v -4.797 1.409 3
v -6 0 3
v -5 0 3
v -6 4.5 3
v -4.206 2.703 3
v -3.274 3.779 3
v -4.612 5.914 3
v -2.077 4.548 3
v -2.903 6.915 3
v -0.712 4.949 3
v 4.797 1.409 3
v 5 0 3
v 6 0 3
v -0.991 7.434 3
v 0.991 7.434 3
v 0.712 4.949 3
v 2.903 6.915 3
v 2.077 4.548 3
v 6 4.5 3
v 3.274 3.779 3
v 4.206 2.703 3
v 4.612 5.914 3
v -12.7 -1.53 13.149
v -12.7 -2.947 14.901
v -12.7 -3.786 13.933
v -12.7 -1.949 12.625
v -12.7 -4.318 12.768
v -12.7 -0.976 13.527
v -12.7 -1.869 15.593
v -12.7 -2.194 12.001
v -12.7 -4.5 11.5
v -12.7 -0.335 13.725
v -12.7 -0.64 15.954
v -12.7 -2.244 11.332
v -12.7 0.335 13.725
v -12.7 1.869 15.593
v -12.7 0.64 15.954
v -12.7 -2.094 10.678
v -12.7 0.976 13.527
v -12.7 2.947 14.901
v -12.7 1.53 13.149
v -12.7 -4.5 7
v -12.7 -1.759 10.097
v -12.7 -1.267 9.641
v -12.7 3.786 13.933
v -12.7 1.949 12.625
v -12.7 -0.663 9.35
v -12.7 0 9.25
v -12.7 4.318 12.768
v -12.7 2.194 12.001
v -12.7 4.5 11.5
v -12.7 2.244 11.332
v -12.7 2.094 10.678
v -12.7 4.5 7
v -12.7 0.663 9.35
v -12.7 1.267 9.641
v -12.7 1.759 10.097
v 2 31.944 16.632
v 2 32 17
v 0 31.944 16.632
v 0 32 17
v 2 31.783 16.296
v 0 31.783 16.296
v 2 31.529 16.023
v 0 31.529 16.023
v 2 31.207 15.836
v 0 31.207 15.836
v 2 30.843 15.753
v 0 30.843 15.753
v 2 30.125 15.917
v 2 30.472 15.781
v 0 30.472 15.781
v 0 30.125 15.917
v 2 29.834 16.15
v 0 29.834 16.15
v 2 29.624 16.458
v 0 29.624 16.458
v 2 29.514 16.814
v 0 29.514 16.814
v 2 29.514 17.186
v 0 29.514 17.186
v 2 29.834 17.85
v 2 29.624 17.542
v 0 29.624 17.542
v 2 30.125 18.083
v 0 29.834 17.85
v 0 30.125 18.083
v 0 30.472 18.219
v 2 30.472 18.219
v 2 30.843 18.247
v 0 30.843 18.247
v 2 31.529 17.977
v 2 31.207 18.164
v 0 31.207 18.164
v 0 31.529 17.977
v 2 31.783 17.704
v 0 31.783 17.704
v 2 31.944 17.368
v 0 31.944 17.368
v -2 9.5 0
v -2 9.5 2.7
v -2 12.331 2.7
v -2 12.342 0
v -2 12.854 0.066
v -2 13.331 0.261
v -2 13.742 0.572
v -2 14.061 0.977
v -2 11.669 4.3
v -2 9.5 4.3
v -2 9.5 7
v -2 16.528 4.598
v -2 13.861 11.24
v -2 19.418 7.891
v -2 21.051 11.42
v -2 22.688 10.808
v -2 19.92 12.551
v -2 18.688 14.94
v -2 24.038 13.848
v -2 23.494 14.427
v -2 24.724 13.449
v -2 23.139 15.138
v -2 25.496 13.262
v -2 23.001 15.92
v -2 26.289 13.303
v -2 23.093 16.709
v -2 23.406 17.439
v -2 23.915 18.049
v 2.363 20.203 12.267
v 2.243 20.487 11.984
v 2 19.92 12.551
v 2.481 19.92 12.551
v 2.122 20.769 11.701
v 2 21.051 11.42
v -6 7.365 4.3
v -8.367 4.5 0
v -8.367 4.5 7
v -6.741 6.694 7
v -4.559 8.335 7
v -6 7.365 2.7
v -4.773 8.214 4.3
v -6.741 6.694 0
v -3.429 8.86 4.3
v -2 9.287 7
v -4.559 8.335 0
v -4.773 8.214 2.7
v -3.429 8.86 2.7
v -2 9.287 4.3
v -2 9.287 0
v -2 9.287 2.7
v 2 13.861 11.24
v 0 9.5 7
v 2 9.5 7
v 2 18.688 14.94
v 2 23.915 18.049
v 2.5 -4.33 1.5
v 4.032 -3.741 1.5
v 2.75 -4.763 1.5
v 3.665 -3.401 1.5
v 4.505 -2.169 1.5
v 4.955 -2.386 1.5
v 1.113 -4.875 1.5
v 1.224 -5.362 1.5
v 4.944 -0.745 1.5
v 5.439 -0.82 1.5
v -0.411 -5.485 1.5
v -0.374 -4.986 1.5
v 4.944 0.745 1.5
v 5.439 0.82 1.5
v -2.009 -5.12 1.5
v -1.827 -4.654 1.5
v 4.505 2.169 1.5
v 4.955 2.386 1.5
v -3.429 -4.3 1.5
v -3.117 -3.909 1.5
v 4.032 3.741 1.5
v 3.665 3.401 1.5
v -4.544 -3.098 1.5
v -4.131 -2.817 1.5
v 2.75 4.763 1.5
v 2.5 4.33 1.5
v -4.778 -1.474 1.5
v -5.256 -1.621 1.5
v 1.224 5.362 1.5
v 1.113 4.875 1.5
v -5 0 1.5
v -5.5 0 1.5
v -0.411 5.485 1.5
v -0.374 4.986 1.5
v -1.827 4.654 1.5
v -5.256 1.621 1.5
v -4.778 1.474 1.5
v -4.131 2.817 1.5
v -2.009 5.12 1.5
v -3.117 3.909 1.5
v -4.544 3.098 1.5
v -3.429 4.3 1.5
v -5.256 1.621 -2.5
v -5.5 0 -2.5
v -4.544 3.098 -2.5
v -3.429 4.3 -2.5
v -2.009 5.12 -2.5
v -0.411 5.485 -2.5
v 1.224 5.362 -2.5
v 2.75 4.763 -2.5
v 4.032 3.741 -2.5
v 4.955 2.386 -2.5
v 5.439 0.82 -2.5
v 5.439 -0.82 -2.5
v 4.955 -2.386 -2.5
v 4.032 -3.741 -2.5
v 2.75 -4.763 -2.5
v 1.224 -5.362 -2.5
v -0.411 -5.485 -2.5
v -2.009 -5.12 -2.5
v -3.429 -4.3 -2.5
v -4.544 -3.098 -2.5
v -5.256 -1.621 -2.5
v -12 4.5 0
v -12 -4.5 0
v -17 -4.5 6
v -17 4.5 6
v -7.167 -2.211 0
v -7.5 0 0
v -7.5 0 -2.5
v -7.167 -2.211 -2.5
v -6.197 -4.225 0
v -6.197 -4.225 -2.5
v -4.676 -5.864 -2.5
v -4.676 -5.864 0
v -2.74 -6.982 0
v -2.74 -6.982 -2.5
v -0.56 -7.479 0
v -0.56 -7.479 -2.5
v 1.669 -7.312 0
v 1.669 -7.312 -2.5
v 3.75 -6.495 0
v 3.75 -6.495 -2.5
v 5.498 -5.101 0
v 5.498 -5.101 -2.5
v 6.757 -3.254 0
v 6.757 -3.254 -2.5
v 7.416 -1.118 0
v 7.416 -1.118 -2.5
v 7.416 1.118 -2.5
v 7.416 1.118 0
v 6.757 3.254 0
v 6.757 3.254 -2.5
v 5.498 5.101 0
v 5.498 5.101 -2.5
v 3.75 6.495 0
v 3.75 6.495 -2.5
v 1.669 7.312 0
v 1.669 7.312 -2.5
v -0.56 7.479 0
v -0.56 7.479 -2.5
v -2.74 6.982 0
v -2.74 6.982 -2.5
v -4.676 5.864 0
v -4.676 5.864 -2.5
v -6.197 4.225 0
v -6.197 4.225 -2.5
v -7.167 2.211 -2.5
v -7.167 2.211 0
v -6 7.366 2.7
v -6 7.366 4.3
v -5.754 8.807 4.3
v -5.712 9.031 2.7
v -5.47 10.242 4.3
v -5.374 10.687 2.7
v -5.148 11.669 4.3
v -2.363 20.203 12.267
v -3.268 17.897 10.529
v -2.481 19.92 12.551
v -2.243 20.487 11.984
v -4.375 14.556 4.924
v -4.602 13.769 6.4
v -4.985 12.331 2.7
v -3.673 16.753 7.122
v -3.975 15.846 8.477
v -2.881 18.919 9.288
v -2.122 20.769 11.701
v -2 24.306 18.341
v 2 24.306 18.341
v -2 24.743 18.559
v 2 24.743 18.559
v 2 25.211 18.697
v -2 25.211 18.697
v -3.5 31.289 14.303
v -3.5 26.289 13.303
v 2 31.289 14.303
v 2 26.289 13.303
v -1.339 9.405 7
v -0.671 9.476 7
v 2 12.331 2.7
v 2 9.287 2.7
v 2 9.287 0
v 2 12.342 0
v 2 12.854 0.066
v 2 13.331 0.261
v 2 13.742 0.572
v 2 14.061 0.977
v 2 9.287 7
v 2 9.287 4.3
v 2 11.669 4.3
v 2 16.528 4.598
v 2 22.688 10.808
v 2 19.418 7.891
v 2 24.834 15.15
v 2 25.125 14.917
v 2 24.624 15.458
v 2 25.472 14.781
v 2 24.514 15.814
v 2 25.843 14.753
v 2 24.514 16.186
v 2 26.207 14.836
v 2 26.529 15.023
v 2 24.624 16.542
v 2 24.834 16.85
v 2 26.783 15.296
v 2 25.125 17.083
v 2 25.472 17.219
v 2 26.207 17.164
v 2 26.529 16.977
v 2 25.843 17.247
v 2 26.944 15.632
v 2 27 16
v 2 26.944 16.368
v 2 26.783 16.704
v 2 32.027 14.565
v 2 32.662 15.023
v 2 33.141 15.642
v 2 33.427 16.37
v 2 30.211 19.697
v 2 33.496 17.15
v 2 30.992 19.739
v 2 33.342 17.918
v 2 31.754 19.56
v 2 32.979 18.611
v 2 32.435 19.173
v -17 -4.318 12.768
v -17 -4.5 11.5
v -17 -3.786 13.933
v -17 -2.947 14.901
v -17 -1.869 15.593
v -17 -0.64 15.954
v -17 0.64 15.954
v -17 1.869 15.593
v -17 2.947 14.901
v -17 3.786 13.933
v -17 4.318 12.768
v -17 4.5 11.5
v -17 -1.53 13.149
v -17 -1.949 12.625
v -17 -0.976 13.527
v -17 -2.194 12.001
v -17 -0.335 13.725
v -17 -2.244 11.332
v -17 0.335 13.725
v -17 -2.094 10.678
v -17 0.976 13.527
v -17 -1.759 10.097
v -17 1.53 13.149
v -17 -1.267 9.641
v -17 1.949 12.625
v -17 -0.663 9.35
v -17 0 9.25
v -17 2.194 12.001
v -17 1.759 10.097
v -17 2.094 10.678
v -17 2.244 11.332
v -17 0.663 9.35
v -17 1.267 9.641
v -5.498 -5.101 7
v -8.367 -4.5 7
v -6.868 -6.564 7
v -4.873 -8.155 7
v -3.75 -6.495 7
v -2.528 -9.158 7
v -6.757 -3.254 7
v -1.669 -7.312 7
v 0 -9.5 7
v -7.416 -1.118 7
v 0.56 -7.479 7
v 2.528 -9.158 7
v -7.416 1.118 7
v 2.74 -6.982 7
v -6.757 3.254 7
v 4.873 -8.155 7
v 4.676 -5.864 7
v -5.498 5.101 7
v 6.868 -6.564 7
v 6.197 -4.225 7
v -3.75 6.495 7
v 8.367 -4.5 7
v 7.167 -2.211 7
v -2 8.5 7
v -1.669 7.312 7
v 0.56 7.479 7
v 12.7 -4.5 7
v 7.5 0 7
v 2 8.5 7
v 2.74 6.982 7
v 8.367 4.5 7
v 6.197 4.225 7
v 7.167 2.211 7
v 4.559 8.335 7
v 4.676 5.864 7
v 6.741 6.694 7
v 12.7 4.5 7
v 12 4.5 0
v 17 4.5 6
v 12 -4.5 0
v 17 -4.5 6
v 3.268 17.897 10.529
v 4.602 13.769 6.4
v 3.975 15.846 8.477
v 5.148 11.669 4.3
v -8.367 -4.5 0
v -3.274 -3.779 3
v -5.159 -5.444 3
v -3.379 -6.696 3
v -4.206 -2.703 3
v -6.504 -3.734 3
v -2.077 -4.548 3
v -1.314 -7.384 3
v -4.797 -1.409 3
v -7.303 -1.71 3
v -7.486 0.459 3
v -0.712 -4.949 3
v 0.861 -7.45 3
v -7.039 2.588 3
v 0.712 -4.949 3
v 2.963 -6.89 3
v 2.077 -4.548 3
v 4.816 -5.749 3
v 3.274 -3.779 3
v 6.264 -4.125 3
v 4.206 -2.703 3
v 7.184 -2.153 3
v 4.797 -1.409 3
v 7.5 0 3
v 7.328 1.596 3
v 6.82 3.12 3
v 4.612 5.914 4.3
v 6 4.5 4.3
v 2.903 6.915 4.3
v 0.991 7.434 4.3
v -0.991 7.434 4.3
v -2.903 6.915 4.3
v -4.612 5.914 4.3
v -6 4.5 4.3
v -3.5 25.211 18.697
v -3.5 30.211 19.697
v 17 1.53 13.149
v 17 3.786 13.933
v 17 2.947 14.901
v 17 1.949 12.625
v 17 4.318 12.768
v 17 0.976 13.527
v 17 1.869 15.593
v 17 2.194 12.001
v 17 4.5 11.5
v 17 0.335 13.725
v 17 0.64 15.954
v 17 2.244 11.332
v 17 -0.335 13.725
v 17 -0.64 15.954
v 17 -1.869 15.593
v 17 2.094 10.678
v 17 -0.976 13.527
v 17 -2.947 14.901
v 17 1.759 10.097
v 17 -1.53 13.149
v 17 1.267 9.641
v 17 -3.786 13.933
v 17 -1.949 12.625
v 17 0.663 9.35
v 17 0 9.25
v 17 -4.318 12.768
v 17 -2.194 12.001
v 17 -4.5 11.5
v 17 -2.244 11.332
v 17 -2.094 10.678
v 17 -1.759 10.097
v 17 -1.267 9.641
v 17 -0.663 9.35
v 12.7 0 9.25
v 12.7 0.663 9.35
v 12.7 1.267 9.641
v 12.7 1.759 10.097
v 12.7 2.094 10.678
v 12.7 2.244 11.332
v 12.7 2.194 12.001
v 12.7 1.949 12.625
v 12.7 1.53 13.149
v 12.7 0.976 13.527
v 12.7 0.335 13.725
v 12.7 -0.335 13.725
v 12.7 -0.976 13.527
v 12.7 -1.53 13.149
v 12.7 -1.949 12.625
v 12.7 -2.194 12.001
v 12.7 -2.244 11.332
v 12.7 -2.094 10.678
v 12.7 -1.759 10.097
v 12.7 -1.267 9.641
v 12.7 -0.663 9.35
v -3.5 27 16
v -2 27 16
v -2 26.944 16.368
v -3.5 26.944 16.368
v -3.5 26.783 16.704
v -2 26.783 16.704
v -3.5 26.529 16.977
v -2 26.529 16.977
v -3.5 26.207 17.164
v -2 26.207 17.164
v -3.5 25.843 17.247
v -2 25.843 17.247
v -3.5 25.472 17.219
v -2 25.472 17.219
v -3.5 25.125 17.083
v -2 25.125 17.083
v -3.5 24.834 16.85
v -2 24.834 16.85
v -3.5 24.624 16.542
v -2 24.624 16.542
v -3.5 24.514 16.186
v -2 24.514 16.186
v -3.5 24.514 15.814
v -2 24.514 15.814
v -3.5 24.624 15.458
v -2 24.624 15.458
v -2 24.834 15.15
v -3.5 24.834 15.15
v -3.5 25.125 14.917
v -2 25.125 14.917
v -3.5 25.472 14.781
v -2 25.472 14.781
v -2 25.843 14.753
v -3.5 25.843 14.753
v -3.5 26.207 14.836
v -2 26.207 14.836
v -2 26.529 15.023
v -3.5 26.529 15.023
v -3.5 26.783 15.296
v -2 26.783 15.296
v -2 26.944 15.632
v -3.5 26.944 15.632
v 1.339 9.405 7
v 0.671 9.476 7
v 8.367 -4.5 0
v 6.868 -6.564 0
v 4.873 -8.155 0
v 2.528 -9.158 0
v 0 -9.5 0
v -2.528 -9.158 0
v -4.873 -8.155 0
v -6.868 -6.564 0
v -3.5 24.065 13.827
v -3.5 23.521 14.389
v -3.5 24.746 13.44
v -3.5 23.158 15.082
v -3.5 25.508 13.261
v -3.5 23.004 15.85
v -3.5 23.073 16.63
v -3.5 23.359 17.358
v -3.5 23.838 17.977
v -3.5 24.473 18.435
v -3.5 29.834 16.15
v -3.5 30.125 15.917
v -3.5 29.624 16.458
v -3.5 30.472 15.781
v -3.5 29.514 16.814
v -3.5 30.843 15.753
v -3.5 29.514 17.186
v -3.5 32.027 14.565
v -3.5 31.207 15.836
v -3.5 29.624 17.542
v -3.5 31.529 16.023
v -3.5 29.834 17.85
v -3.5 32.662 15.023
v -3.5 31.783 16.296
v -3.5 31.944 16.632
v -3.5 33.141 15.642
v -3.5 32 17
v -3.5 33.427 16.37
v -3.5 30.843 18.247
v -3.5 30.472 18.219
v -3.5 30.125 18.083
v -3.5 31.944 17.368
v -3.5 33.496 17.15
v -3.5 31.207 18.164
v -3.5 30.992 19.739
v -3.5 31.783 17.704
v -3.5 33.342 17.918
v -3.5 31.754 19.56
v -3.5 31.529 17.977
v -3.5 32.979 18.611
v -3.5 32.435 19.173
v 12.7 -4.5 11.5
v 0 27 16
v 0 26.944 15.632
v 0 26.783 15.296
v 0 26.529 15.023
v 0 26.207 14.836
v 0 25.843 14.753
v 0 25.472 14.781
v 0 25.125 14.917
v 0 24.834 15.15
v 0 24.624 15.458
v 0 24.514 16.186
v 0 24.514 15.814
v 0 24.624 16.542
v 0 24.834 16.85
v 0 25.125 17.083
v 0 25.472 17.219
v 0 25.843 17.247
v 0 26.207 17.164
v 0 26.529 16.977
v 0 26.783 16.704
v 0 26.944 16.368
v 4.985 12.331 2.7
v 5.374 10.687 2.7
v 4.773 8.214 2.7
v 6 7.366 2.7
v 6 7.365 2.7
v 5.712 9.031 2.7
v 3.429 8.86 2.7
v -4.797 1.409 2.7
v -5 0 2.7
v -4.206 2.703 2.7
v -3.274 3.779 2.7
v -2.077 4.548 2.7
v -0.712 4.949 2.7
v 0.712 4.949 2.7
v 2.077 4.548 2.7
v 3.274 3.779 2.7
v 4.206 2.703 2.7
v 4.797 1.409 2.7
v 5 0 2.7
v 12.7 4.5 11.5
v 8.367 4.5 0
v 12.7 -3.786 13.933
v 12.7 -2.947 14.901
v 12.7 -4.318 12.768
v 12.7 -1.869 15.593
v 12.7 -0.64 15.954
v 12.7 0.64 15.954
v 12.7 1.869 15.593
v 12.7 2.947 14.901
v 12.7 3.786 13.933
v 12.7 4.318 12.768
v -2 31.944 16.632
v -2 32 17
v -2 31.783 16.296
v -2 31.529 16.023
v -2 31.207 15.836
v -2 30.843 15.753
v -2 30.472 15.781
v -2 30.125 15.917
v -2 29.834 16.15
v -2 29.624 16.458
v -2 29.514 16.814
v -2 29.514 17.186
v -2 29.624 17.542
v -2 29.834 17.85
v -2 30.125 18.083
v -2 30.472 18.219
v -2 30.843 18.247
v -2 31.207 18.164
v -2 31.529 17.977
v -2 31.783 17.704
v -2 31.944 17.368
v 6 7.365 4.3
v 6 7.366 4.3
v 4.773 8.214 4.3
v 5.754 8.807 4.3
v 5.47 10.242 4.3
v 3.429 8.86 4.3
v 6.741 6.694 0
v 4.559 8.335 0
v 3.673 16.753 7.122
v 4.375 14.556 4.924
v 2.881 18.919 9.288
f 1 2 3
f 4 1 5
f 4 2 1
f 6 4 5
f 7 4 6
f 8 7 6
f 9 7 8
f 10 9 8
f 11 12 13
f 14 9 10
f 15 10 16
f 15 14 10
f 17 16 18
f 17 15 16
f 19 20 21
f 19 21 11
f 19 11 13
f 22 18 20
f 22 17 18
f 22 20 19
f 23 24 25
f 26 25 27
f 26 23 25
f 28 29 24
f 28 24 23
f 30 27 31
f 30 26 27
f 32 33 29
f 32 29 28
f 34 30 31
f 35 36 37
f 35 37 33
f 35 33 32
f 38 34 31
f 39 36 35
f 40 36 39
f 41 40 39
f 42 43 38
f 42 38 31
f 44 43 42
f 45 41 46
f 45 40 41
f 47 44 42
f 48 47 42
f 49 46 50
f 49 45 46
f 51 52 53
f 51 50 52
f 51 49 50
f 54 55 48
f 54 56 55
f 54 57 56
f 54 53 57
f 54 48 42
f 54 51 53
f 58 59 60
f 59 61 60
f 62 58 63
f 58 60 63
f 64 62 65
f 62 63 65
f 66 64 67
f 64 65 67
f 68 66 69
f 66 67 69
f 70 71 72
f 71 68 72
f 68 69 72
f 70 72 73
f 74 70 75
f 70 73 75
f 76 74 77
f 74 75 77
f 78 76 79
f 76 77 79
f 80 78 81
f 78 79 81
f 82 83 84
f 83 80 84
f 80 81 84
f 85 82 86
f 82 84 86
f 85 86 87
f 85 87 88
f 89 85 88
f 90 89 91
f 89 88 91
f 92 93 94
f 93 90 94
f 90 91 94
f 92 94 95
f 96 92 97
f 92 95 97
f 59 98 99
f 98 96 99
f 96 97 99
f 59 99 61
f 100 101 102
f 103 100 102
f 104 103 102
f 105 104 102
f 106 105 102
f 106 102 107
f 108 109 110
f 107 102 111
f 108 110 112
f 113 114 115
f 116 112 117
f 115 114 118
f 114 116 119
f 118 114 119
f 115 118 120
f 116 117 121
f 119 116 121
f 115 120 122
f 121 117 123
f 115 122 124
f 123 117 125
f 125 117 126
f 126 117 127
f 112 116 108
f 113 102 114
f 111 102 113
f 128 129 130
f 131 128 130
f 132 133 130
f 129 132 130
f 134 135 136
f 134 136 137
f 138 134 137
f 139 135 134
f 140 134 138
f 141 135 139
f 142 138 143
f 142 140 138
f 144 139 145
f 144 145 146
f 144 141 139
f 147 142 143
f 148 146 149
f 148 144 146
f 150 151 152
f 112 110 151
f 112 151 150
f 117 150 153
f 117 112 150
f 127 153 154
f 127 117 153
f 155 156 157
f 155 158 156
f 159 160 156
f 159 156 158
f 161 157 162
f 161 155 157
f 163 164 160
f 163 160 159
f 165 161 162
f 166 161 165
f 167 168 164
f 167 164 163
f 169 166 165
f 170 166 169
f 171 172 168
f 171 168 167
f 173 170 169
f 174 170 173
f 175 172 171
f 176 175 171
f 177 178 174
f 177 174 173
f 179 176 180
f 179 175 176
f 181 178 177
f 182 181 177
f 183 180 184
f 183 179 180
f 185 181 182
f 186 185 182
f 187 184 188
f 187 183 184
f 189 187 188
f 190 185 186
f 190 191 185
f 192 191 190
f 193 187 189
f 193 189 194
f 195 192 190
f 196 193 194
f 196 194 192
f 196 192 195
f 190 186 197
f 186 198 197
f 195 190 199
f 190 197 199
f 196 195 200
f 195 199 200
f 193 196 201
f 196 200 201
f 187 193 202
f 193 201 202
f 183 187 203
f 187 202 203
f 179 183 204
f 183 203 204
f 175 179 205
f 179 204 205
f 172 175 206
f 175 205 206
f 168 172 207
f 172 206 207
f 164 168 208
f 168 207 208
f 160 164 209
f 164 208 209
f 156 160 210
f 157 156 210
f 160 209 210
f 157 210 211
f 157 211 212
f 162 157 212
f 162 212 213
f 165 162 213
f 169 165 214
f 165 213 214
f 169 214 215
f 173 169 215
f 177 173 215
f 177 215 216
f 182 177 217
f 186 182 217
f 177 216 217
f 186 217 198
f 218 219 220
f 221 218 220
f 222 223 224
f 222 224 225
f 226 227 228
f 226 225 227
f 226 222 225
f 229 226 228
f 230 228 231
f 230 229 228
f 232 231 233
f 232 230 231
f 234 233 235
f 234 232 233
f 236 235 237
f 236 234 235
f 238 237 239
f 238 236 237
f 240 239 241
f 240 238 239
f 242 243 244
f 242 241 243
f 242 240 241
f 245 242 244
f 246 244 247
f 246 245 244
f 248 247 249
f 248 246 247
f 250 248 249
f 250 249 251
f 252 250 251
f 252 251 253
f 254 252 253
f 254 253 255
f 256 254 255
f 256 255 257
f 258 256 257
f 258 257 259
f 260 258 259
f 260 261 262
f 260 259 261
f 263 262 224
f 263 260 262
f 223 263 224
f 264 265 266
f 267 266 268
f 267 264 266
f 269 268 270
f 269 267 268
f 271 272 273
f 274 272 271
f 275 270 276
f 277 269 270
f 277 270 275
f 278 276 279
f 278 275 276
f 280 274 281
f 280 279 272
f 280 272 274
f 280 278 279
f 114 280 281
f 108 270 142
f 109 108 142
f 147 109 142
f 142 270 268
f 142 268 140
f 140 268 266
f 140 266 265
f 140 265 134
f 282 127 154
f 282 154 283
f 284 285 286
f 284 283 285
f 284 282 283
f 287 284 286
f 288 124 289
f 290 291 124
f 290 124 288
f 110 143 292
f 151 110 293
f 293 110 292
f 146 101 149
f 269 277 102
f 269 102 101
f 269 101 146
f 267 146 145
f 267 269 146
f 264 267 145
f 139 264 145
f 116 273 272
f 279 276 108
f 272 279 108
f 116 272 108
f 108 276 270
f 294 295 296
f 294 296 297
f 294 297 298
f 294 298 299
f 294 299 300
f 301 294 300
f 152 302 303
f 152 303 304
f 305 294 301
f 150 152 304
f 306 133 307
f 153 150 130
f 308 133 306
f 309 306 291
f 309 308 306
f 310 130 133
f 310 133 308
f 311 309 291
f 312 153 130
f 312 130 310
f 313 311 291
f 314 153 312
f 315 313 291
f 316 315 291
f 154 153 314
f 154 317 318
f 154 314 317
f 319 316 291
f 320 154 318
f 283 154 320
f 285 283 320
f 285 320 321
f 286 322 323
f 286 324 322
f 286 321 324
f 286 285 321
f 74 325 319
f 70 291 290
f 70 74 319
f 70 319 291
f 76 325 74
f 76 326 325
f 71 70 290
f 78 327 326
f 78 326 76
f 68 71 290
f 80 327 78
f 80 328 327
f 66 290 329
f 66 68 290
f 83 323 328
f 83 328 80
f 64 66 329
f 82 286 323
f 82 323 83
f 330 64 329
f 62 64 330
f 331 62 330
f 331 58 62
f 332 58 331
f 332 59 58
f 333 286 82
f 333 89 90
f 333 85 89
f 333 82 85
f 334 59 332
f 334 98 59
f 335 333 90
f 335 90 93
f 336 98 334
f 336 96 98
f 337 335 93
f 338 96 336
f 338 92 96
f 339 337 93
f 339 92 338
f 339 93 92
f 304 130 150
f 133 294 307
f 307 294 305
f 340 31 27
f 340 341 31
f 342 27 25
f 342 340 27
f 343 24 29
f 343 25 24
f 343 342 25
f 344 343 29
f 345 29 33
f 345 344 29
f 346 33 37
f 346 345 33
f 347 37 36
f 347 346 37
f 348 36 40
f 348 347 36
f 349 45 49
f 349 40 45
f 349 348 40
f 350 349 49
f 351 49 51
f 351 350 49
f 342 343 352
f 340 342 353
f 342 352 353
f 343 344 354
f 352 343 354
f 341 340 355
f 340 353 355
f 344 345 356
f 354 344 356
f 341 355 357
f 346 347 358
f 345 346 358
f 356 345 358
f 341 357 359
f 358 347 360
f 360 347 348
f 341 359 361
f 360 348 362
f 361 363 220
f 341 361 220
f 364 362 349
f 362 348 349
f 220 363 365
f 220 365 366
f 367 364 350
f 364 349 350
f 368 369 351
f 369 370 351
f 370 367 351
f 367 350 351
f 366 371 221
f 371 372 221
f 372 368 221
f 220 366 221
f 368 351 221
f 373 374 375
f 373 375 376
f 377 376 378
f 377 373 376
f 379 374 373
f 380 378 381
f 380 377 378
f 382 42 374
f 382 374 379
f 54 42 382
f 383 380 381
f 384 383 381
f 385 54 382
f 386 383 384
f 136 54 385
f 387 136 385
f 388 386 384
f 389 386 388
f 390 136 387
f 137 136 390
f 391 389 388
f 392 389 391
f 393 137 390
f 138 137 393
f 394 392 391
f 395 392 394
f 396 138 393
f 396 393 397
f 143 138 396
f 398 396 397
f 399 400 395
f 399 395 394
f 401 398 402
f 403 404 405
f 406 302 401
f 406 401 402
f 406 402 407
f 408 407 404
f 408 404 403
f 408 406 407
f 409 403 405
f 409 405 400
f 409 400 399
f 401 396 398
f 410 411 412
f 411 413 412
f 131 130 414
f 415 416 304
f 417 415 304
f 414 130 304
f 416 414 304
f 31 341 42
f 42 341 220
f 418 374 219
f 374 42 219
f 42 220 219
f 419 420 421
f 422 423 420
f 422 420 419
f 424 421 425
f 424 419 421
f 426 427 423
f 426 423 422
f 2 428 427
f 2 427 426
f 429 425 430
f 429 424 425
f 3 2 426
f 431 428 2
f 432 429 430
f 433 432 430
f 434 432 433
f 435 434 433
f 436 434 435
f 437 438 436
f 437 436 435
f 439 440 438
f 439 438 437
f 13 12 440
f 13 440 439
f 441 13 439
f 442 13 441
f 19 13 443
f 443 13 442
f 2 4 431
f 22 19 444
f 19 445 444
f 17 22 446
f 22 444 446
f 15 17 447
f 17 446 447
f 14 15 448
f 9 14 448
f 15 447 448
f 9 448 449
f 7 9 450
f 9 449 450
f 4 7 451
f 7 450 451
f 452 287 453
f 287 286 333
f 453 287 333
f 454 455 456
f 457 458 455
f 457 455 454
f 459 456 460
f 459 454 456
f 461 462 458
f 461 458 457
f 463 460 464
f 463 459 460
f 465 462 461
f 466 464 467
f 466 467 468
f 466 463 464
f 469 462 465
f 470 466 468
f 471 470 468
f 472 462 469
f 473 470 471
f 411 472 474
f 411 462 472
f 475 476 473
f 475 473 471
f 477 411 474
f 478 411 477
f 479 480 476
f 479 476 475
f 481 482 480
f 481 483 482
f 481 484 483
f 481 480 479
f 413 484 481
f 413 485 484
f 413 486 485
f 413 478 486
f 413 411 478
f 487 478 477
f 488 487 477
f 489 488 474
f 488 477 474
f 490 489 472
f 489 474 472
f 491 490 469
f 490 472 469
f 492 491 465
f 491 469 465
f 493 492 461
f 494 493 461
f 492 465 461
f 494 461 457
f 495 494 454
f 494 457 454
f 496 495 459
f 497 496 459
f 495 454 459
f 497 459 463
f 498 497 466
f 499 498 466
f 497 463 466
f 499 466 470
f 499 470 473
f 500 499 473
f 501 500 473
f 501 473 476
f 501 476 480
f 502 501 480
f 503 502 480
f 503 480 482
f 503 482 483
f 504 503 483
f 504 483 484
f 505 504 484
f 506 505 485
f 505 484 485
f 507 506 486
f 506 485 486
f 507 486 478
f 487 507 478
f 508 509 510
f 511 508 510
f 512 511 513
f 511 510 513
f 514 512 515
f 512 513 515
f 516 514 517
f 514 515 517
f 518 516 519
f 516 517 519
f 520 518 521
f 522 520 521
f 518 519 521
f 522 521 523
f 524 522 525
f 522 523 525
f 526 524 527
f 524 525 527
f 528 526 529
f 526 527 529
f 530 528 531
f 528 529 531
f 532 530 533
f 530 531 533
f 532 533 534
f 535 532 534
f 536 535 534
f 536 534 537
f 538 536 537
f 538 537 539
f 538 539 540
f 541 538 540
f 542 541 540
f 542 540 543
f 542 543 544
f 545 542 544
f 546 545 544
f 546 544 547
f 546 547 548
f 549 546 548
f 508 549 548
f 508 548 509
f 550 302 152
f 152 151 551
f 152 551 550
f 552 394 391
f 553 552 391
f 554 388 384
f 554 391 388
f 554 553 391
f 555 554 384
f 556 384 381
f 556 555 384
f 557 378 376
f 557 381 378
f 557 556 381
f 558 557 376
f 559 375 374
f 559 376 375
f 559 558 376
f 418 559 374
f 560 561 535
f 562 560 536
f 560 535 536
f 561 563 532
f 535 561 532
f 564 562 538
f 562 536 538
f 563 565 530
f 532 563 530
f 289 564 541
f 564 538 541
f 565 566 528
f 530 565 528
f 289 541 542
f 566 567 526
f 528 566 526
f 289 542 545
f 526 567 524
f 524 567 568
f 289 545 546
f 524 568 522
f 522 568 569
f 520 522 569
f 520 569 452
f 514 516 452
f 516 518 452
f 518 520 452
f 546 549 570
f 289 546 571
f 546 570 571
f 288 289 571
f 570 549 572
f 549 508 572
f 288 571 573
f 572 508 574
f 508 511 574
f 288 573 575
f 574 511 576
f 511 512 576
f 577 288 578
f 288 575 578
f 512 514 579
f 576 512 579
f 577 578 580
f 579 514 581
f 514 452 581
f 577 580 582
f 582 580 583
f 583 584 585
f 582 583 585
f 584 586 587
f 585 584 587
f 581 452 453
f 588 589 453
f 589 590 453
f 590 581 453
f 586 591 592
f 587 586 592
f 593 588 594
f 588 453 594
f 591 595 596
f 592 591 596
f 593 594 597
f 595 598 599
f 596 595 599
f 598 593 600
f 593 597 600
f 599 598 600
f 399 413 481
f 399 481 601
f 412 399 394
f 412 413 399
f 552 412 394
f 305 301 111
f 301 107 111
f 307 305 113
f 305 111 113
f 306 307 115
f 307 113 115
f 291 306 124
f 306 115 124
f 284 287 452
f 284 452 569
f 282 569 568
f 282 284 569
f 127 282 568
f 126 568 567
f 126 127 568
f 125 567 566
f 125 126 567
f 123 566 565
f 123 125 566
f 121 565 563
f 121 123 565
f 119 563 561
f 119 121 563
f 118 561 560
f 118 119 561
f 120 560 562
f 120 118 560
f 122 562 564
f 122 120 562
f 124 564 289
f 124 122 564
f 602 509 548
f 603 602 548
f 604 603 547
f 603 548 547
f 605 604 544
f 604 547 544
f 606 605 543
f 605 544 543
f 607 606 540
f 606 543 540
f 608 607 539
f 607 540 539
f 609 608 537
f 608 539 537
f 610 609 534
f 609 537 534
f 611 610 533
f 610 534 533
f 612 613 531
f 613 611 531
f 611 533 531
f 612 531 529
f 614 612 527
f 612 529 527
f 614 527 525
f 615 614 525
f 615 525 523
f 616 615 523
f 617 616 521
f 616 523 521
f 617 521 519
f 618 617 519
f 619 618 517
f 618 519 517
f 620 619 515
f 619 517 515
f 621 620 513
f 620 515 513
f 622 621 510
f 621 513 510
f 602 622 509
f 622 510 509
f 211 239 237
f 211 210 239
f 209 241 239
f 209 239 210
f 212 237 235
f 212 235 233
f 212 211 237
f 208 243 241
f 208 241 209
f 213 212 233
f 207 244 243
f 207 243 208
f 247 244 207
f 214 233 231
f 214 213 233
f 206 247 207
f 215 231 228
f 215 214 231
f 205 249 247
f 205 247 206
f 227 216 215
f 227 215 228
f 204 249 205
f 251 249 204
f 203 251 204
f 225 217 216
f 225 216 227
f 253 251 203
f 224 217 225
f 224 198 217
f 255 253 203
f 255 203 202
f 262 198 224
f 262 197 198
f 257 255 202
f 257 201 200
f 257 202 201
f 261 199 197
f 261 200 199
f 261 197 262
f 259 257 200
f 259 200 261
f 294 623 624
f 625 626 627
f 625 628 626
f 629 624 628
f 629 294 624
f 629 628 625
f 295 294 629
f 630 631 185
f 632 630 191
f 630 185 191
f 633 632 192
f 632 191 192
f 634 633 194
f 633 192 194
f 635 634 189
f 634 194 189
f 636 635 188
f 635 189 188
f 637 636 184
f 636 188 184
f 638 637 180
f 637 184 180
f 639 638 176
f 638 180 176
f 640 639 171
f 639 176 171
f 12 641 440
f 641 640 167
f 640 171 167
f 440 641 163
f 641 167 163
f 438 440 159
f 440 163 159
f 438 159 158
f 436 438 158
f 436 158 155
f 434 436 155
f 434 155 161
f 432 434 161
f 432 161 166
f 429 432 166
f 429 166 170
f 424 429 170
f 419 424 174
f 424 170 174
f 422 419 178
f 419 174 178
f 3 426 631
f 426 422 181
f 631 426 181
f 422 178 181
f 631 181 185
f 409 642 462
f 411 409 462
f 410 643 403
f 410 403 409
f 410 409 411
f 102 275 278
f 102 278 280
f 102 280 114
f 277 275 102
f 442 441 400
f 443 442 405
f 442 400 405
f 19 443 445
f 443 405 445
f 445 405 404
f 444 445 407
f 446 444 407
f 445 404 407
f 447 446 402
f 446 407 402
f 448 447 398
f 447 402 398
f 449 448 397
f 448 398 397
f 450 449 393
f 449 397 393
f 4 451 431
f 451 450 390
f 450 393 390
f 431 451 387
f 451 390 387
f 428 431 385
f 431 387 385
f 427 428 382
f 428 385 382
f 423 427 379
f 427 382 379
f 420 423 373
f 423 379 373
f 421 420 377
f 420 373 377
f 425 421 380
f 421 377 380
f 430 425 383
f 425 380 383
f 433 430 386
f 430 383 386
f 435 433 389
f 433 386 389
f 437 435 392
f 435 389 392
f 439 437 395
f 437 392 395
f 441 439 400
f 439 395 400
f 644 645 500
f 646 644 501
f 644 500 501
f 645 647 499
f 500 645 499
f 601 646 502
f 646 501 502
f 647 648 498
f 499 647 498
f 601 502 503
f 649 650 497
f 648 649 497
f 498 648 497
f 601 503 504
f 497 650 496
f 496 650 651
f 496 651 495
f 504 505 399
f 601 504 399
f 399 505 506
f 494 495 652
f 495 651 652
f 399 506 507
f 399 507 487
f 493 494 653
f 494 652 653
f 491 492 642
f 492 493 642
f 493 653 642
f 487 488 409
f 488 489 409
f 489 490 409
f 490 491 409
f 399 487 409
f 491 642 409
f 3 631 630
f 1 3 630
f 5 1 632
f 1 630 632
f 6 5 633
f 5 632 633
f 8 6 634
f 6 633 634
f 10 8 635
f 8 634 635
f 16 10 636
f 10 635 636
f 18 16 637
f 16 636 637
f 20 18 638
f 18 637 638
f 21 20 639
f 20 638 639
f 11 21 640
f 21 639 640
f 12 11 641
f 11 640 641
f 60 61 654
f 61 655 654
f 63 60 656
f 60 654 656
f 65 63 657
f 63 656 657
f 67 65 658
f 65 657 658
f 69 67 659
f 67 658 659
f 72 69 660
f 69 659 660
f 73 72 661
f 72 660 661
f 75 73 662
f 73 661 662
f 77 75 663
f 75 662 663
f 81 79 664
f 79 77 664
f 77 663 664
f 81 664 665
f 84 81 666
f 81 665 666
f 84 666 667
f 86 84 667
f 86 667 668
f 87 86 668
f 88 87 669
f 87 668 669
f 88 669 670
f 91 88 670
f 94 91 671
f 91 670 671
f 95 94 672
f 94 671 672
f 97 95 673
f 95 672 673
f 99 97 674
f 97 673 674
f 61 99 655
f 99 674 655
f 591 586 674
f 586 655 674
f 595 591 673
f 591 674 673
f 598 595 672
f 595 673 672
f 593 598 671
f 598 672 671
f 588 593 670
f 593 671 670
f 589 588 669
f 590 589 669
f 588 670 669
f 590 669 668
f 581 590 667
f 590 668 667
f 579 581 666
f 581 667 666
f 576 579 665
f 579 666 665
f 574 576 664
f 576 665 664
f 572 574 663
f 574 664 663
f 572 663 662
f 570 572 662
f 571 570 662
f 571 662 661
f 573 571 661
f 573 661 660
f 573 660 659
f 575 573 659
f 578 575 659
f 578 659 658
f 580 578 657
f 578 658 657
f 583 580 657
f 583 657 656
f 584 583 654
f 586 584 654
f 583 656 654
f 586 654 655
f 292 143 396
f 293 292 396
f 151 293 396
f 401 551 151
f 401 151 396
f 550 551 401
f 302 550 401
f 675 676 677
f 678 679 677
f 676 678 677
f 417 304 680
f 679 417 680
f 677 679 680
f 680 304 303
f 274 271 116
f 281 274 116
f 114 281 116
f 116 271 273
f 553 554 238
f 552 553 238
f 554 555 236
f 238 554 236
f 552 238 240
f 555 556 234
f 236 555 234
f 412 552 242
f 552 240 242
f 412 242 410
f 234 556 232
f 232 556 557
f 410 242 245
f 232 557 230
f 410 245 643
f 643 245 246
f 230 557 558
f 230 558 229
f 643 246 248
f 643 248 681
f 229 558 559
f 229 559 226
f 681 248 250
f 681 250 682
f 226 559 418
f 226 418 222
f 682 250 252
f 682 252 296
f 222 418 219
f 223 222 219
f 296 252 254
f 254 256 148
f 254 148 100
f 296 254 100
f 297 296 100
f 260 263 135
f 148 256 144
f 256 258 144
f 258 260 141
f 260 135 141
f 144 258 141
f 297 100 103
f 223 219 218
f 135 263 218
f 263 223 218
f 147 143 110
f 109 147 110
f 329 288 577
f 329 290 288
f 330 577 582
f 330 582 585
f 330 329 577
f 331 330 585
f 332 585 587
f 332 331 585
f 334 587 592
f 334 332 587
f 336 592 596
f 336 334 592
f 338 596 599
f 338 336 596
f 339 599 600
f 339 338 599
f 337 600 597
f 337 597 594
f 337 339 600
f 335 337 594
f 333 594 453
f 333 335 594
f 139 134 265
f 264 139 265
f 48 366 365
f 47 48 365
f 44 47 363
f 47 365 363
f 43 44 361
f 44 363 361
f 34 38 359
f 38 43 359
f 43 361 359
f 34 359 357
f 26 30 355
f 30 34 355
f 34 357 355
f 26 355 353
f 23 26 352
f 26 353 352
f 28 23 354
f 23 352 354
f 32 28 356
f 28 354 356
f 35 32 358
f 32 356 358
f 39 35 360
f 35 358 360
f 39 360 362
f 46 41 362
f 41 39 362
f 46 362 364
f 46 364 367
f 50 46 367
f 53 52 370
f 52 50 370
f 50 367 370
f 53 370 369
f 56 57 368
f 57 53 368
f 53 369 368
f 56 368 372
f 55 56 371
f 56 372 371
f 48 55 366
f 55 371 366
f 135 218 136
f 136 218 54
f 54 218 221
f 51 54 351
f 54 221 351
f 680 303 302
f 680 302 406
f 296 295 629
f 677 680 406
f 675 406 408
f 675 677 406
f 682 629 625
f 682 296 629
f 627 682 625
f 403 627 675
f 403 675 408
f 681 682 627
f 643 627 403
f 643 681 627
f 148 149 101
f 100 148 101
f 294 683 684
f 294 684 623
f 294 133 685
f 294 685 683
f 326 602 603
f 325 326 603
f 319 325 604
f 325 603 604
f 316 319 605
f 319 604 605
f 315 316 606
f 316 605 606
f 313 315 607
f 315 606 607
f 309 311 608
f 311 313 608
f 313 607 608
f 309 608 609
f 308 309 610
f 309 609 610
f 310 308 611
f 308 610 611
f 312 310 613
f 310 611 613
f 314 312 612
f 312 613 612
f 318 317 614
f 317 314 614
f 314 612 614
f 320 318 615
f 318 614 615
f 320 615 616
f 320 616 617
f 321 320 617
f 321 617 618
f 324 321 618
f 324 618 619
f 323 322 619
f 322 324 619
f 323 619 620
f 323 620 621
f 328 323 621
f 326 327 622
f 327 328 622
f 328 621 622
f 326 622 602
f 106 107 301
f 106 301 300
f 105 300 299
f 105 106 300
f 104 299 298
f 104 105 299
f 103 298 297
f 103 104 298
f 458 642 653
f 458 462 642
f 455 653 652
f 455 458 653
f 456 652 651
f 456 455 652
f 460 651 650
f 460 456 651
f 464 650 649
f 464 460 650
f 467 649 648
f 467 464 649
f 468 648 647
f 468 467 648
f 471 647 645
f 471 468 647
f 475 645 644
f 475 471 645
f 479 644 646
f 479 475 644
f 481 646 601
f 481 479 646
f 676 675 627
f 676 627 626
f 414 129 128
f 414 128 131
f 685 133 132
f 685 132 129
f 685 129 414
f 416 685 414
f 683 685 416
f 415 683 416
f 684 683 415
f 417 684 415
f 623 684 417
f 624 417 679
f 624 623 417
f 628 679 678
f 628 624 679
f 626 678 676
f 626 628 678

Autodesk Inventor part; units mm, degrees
ref_plane "YZ Plane" through (0, 0, 0) normal (1, 0, 0) x (0, 1, 0)
ref_plane "XZ Plane" through (0, 0, 0) normal (0, 1, 0) x (-1, 0, 0)
ref_plane "XY Plane" through (0, 0, 0) normal (0, 0, 1) x (1, 0, 0)
sketch "Sketch1" plane through (0, 0, 0) normal (0, 0, 1) x (1, 0, 0)
  line L0 (17, 4.5) -> (17, -4.5)
  line L1 (-17, -4.5) -> (-17, 4.5)
  arc A0 (-8.3666, -4.5) -> (8.3666, -4.5) centre (0, 0) ccw
  arc A1 (8.3666, 4.5) -> (-8.3666, 4.5) centre (0, 0) ccw
  line L2 (-17, 4.5) -> (-8.3666, 4.5)
  line L3 (8.3666, 4.5) -> (17, 4.5)
  line L4 (17, -4.5) -> (8.3666, -4.5)
  line L5 (-8.3666, -4.5) -> (-17, -4.5)
  line L6 (-17, 4.5) -> (17, -4.5) construction
  line L7 (-17, -4.5) -> (17, 4.5) construction
  point P0 (0, 0)
  point P1 (0, 0)
  dimension "d0" = 9
  dimension "d1" = 34
  dimension "d2" = 9.5
  dimension "d3" = 9
  dimension "d4" = 9.5
  dimension "d12" = 4.5
extrude "Extrusion1" add sketch "Sketch1" along normal blind 7
sketch "Sketch2" plane through (17, -4.5, 0) normal (1, 0, 0) x (0, 0, -1)
  arc A0 (-11.5, 9) -> (-11.5, 0) centre (-11.5, 4.5) ccw
  circle A1 centre (-11.5, 4.5) radius 2.25
  line L0 (-7, 9) -> (-11.5, 9)
  line L1 (-11.5, 0) -> (-7, 0)
  line L2 (-7, 0) -> (-7, 9)
  point P0 (0, 4.5)
  point P1 (-7, 0)
  dimension "d7" = 9
  dimension "d8" = 4.5
  dimension "d9" = 9
extrude "Extrusion2" add sketch "Sketch2" against normal blind 4.3
extrude "Extrusion3" add sketch "Sketch2" along normal blind 4.3 from surface at -34
sketch "Sketch3" plane through (-17, -4.5, 0) normal (0, -1, 0) x (1, 0, 0)
  line L0 (0, 6) -> (0, 0)
  line L1 (0, 0) -> (5, 0)
  line L2 (5, 0) -> (0, 6)
  line L3 (29, 0) -> (34, 0)
  line L4 (34, 0) -> (34, 6)
  line L5 (34, 6) -> (29, 0)
  point P0 (17, 0)
  dimension "d15" = 6
  dimension "d16" = 5
  dimension "d17" = 6
  dimension "d18" = 5
extrude "Extrusion4" cut sketch "Sketch3" against normal up to next
sketch "Sketch4" plane through (0, 0, 0) normal (0, 0, -1) x (-1, 0, 0)
  circle A0 centre (0, 0) radius 7.5
  dimension "d21" = 15
extrude "Extrusion5" add sketch "Sketch4" along normal blind 2.5
sketch "Sketch5" plane through (0, 0, 7) normal (0, 0, 1) x (1, 0, 0)
  circle A0 centre (0, 0) radius 7.5
  dimension "d24" = 15
extrude "Extrusion6" cut sketch "Sketch5" against normal blind 4
sketch "Sketch6" plane through (0, 0, -2.5) normal (0, 0, -1) x (-1, 0, 0)
  circle A0 centre (0, 0) radius 5.5
  dimension "d27" = 11
extrude "Extrusion7" cut sketch "Sketch6" against normal blind 4
sketch "Sketch7" plane through (0, 0, 1.5) normal (0, 0, -1) x (-1, 0, 0)
  circle A0 centre (0, 0) radius 5
  dimension "d30" = 10
extrude "Extrusion8" cut sketch "Sketch7" against normal up to next
sketch "Sketch9" plane through (0, 0, 0) normal (1, 0, 0) x (0, 1, 0)
  arc A0 (31.2893, 14.3034) -> (30.2107, 19.6966) centre (30.75, 17) ccw
  line L0 (-9.5504, 0) -> (57.3026, 0) projected
  line L1 (0, -37.6235) -> (0, 29.8791) projected
  circle A1 centre (30.75, 17) radius 1.25
  arc A2 (25.2107, 18.6966) -> (23.9154, 18.0486) centre (25.75, 16) ccw
  circle A3 centre (25.75, 16) radius 1.25
  line L2 (9.5, 7) -> (9.5, 0)
  line L3 (9.5, 0) -> (12.3425, 0)
  line L4 (25.2107, 18.6966) -> (30.2107, 19.6966)
  line L5 (26.2893, 13.3034) -> (31.2893, 14.3034)
  arc A4 (23.9154, 18.0486) -> (9.5, 7) centre (47.7522, -27.9802) ccw
  arc A5 (26.2893, 13.3034) -> (14.061, 0.9769) centre (44.8843, -17.3723) ccw
  arc A6 (12.3425, 0) -> (14.061, 0.9769) centre (12.3425, 2) ccw
  line L6 (8.5, 7) -> (9.5, 7)
  line L7 (9.5, 7) -> (9.5, 0)
  line L8 (9.5, 0) -> (8.5, 0)
  line L9 (8.5, 0) -> (8.5, 7)
  point P0 (0, 0)
  point P1 (13.5, 0)
  dimension "d53" = 5.5
  dimension "d54" = 17
  dimension "d55" = 30.75
  dimension "d56" = 2.5
  dimension "d57" = 16
  dimension "d58" = 25.75
  dimension "d59" = 4
  dimension "d60" = 7
  dimension "d61" = 9.5
  dimension "d62" = 0
  dimension "d63" = 51.8348
  dimension "d64" = 35.8716
  dimension "d65" = 2
  dimension "d88" = 7
  dimension "d89" = 1
  dimension "d90" = 0
  dimension "d91" = 0
extrude "Extrusion9" add sketch "Sketch9" along normal mid plane 4 contours L5 A5 A6 L0 L2 A4 A2 L4 A0
sketch "Sketch10" plane through (0, 0, 0) normal (1, 0, 0) x (0, 1, 0)
  arc A0 (25.2107, 18.6966) -> (26.2893, 13.3034) centre (25.75, 16) ccw
  circle A1 centre (25.75, 16) radius 1.25 projected
  arc A2 (31.2893, 14.3034) -> (30.2107, 19.6966) centre (30.75, 17) ccw
  circle A3 centre (25.75, 16) radius 1.25
  circle A4 centre (30.75, 17) radius 1.25
  circle A5 centre (30.75, 17) radius 1.25 projected
  line L0 (25.2107, 18.6966) -> (30.2107, 19.6966)
  line L1 (26.2893, 13.3034) -> (31.2893, 14.3034)
  point P0 (0, 0)
  dimension "d68" = 5.5
  dimension "d69" = 2.5
extrude "Extrusion10" add sketch "Sketch10" against normal blind 3.5
sketch "Sketch11" plane through (0, 0, 0) normal (1, 0, 0) x (0, 1, 0)
  line L0 (-4.2102, 0) -> (25.2612, 0) projected
  line L1 (0, -2.5102) -> (0, 15.0612) projected
  line L2 (19.9196, 12.551) -> (11.6686, 4.3)
  line L3 (11.6686, 4.3) -> (0, 4.3)
  line L4 (21.051, 11.4196) -> (12.3314, 2.7)
  line L5 (12.3314, 2.7) -> (0, 2.7)
  line L6 (21.051, 11.4196) -> (19.9196, 12.551)
  line L7 (0, 4.3) -> (0, 2.7)
  point P0 (0, 0)
extrude "Extrusion11" add sketch "Sketch11" along normal mid plane 12
extrude "Extrusion12" cut sketch "Sketch5" against normal blind 4
extrude "Extrusion13" cut sketch "Sketch7" against normal through all
sketch "Sketch12" plane through (0, 0, 0) normal (0, 0, 1) x (1, 0, 0)
  line L0 (6, 7.3655) -> (6, 12.3314) projected
  line L1 (2, 21.051) -> (6, 21.051) projected
  arc A0 (6, 7.3655) -> (2, 21.051) centre (-49.0316, -1.2919) ccw
  line L2 (0, 0) -> (0, 16.5543) construction
  arc A1 (-2, 21.051) -> (-6, 7.3655) centre (49.0316, -1.2919) ccw
  line L3 (2, 26.2893) -> (2, 14.061) construction
  line L4 (2, 21.051) -> (6, 21.051)
  line L5 (6, 7.3655) -> (6, 21.051)
  line L6 (-6, 7.3655) -> (-6, 21.051)
  line L7 (-2, 21.051) -> (-6, 21.051)
extrude "Extrusion14" cut sketch "Sketch12" along normal up to next
sketch "Sketch13" plane through (0, 0, 0) normal (1, 0, 0) x (0, 1, 0)
  line L0 (8.5, 7) -> (9.5, 7)
  line L1 (9.5, 7) -> (9.5, 0)
  line L2 (9.5, 0) -> (8.5, 0)
  line L3 (8.5, 0) -> (8.5, 7)
  line L4 (0, -6.95) -> (0, 24.2) projected
  line L5 (-18.1, 0) -> (42.1, 0) projected
  point P0 (0, 0)
  dimension "d92" = 7
  dimension "d93" = 1
  dimension "d94" = 9.5
  dimension "d95" = 0
extrude "Extrusion15" add sketch "Sketch13" along normal mid plane 4
properties part number "RCT-P006_steering_knuckle"
